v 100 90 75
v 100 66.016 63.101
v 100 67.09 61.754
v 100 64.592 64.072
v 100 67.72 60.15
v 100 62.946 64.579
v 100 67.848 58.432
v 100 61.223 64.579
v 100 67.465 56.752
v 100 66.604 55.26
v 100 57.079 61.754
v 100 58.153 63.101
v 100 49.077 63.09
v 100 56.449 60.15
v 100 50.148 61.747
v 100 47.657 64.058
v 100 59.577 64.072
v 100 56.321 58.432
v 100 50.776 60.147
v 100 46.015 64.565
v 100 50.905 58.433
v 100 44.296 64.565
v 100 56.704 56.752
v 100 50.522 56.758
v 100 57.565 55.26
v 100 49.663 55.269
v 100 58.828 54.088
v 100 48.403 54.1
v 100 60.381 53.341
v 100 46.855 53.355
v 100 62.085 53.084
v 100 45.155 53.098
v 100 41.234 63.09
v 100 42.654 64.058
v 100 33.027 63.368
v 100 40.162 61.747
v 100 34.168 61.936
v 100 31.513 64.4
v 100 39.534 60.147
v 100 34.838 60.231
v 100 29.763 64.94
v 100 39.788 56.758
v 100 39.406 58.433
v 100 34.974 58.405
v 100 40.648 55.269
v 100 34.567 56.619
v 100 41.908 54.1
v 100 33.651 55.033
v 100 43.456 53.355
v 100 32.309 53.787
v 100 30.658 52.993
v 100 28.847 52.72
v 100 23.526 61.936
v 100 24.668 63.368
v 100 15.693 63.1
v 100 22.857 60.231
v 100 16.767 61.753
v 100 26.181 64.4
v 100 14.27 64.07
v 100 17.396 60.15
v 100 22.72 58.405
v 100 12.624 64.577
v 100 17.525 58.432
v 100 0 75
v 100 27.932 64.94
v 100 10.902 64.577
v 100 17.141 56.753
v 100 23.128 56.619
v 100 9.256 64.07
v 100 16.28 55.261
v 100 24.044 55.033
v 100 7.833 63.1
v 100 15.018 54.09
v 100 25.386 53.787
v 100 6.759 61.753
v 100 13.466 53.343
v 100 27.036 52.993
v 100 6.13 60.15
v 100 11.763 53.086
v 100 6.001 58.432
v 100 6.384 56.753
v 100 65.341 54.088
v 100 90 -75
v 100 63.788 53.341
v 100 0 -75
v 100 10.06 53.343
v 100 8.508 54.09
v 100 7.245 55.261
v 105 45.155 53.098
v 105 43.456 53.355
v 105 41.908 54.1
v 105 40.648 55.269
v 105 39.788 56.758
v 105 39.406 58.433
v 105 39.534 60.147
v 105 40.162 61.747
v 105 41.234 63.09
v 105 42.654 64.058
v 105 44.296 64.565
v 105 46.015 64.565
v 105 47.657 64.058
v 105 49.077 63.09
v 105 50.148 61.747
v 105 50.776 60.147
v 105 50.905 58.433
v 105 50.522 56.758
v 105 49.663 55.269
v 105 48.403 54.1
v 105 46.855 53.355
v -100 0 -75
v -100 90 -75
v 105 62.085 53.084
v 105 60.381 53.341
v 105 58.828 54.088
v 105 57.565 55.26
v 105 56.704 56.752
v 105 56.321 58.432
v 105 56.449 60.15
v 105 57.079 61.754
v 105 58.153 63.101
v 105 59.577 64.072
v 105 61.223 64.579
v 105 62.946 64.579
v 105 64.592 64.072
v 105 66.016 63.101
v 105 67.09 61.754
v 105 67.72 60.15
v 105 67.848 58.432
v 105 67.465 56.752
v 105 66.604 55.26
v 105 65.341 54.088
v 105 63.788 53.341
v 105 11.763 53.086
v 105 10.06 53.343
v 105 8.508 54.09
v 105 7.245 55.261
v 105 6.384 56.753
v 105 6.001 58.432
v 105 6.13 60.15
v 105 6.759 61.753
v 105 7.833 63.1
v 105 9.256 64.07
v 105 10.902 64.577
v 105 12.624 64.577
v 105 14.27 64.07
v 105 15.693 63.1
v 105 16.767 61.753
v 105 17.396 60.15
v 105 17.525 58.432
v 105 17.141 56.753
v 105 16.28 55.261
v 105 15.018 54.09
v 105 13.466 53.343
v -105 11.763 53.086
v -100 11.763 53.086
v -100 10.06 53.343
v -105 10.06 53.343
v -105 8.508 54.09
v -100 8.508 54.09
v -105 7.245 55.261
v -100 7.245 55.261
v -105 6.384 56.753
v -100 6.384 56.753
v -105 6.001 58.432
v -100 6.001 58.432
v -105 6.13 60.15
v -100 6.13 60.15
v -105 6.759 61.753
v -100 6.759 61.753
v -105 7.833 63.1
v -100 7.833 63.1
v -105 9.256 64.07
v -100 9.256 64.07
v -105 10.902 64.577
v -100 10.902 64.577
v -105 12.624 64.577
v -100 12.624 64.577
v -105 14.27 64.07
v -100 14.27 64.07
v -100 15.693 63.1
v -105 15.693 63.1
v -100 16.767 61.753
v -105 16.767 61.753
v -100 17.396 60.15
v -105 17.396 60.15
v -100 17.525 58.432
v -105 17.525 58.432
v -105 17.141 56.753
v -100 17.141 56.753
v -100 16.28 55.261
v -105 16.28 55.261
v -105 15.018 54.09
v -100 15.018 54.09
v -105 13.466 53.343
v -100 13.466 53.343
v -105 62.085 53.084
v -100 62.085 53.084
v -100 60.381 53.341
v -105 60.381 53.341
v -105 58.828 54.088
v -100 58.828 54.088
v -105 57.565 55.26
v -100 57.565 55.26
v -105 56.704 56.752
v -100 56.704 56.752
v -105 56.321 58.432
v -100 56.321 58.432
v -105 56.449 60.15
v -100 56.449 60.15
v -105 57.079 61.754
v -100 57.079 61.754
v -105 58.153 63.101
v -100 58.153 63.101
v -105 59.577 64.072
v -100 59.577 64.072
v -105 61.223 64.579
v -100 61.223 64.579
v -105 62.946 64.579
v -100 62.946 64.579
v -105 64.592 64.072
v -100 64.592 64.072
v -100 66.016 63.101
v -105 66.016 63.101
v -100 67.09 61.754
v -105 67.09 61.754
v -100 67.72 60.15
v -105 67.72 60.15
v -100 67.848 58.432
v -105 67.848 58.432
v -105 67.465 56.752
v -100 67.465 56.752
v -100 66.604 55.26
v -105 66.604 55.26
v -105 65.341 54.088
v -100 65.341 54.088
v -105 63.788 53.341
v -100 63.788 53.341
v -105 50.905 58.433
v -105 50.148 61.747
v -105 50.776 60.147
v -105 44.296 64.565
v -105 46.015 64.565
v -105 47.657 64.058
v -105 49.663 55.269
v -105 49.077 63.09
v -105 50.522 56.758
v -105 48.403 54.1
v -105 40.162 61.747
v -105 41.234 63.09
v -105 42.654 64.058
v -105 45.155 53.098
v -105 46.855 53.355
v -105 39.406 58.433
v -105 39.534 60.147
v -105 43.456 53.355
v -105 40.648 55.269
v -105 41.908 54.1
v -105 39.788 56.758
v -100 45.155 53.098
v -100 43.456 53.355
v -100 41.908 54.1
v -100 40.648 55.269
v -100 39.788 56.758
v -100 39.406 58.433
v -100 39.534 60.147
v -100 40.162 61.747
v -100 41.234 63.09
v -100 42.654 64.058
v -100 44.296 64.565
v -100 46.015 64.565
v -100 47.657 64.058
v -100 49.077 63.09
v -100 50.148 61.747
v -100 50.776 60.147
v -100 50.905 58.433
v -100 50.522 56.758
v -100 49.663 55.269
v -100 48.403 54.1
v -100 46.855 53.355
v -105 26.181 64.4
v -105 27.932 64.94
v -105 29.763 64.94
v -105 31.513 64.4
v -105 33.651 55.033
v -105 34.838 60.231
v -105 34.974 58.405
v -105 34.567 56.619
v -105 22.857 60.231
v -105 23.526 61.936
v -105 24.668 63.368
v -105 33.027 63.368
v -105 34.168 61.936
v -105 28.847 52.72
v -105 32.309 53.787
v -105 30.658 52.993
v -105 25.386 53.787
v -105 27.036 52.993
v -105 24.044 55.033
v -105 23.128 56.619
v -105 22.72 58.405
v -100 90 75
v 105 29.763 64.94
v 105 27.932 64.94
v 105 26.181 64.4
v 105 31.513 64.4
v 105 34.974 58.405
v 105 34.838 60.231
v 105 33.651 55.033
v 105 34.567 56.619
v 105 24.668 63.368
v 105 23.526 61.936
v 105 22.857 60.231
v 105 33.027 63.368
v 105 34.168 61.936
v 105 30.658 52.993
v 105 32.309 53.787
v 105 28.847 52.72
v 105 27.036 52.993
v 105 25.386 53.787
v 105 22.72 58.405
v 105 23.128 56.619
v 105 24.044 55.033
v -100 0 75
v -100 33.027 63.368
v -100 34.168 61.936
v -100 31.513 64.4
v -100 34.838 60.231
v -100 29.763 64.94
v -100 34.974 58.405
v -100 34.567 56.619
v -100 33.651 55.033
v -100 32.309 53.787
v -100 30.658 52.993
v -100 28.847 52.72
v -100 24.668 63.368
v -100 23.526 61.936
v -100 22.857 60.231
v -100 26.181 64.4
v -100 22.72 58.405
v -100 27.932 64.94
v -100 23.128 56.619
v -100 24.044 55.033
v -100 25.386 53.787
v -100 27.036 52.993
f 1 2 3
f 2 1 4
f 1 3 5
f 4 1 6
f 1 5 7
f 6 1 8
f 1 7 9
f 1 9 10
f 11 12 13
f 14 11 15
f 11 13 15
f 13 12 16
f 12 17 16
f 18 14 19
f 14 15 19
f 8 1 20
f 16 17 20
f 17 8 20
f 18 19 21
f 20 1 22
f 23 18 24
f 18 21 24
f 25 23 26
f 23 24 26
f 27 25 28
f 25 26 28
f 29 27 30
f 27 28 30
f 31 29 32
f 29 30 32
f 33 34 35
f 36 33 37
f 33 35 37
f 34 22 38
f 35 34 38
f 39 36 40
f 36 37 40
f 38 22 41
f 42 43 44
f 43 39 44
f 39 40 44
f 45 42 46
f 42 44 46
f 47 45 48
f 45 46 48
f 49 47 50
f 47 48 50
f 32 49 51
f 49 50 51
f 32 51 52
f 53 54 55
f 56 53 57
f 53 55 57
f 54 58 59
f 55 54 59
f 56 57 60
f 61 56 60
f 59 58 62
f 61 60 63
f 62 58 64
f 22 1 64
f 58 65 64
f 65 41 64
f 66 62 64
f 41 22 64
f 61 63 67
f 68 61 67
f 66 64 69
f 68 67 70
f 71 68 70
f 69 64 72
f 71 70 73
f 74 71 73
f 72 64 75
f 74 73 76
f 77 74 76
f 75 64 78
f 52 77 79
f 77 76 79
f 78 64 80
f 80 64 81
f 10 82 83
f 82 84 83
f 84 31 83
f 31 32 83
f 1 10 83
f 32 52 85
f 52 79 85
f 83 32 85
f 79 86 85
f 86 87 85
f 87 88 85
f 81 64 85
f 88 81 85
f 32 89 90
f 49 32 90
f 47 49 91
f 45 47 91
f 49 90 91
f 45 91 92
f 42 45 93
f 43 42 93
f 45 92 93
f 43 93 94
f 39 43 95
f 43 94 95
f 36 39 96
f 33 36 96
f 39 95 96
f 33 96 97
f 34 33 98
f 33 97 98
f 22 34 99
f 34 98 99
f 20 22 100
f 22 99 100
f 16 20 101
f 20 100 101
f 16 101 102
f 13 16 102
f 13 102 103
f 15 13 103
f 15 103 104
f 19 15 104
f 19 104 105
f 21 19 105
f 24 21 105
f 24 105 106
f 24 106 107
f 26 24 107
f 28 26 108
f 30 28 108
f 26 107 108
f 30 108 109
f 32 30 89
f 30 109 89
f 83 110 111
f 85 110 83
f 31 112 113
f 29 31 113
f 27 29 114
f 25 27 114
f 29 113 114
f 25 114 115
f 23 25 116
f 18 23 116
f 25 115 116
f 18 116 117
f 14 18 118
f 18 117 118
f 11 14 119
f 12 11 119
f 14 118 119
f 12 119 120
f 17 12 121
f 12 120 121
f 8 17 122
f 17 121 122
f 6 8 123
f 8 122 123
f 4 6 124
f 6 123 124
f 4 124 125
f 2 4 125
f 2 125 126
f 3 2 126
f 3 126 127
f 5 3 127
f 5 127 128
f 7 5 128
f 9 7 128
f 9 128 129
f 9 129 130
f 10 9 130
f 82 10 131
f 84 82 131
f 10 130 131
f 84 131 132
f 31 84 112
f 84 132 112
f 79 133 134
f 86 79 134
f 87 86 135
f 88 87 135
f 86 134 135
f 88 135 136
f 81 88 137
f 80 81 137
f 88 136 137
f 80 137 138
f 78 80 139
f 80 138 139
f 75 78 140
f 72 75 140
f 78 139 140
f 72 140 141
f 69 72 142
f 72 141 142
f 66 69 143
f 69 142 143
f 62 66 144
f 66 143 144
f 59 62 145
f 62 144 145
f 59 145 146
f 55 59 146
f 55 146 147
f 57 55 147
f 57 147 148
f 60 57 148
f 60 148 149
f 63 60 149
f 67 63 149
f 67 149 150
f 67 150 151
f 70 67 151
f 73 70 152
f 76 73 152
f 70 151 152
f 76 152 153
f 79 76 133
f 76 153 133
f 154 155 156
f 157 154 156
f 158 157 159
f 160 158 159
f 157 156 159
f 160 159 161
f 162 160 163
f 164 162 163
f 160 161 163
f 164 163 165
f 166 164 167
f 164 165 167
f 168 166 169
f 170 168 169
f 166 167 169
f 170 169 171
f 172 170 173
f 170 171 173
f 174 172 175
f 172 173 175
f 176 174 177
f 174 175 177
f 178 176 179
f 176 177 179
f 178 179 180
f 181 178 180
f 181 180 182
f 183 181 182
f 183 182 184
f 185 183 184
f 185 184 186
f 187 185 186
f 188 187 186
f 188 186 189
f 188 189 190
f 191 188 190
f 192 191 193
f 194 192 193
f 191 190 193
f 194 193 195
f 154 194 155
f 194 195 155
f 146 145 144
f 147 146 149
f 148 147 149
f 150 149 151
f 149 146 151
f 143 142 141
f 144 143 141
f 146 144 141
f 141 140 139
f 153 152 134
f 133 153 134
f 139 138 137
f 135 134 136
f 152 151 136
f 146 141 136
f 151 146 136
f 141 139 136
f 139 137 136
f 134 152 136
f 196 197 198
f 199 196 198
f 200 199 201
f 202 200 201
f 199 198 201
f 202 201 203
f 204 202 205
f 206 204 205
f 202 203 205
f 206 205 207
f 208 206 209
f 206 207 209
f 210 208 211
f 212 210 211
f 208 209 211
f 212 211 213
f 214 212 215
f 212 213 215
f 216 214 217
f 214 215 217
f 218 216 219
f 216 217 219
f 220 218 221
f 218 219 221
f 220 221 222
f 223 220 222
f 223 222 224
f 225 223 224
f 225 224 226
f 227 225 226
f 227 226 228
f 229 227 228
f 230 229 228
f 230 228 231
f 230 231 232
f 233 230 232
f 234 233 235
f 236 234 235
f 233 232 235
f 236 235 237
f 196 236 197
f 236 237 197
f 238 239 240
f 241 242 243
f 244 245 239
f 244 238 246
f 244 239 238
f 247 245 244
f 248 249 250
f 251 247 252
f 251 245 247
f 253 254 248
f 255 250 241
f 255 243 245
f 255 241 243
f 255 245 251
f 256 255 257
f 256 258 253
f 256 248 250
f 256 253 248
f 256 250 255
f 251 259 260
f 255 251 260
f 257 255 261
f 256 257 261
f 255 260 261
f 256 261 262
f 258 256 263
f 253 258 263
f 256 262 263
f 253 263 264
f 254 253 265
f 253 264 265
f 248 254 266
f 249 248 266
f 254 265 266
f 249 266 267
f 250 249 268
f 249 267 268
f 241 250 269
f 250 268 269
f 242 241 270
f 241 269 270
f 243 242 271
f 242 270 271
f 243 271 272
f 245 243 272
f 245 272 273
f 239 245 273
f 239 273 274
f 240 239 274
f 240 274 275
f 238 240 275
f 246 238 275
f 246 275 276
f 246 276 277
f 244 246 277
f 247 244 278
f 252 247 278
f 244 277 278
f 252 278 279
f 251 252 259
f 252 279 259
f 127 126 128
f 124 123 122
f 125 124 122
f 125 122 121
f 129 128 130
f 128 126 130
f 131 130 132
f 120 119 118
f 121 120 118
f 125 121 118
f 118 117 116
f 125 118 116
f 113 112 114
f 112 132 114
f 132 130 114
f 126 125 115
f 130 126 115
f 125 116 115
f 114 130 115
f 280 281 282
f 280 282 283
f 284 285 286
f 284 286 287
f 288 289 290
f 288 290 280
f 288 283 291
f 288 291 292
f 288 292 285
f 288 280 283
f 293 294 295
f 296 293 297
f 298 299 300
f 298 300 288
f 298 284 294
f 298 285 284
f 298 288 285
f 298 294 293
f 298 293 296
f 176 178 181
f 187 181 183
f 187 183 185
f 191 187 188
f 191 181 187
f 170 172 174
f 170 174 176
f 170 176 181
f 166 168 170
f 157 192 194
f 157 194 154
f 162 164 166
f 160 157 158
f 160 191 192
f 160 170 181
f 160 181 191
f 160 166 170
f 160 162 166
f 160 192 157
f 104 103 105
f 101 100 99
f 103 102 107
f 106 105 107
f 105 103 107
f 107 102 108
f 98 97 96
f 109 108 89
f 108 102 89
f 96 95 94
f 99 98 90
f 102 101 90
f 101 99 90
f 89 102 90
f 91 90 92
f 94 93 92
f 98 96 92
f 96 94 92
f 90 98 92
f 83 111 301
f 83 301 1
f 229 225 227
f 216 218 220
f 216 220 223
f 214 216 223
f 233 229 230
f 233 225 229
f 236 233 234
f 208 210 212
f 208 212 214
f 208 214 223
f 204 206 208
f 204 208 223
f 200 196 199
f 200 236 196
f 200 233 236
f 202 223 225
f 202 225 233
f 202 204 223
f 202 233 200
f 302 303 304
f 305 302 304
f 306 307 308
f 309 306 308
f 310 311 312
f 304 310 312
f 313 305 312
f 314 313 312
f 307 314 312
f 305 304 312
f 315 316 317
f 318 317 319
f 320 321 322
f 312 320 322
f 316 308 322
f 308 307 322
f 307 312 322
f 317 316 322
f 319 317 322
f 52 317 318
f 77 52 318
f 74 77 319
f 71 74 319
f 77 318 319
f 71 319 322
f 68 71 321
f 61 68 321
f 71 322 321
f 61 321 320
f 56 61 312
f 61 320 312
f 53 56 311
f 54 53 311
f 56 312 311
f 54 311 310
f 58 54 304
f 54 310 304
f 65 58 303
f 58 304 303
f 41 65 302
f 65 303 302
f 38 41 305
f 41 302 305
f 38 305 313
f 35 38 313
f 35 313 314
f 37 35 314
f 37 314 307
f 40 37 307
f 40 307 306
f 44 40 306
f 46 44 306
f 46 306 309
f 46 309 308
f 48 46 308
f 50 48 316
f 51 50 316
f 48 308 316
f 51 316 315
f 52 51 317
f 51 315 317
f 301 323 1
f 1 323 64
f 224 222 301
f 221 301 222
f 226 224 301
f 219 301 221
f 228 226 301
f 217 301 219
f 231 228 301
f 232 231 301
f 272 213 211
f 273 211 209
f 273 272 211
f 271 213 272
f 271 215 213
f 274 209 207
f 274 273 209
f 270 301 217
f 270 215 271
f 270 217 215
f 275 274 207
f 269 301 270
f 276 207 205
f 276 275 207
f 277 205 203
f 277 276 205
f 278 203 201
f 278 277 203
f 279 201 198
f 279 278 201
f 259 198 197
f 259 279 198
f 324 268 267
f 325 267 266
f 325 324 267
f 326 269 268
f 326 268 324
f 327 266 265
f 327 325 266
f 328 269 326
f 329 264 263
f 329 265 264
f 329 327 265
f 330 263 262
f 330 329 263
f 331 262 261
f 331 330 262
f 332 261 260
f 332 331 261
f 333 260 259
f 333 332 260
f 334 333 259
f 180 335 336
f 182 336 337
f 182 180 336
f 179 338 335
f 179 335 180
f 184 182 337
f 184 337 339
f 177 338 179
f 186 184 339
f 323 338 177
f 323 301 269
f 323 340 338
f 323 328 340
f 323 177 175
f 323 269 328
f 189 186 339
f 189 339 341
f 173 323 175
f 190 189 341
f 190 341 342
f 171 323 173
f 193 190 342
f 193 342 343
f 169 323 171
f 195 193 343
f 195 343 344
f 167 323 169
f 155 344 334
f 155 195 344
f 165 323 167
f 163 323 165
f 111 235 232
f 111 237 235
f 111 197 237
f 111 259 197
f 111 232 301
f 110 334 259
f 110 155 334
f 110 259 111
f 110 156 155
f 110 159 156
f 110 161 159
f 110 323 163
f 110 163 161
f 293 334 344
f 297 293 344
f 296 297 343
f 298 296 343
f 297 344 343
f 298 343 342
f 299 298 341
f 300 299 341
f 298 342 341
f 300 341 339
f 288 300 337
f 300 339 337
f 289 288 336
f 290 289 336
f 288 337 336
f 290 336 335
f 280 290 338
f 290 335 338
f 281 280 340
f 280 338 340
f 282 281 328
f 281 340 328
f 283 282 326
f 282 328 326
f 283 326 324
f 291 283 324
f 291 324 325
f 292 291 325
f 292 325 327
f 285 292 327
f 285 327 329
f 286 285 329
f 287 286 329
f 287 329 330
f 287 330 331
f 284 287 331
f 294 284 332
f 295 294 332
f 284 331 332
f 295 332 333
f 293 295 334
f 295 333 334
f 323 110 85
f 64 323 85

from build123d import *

# Parameters (mm, degrees)
SKETCH1_W           = 200
SKETCH1_H           = 150
BOSS_EXTRUDE1_DEPTH = 90
SKETCH2_R           = 5.778007253
SKETCH2_R_2         = 6.144226379
SKETCH2_R_3         = 5.765469067
SKETCH2_R_4         = 5.780094306
BOSS_EXTRUDE2_DEPTH = 5
BOSS_EXTRUDE3_START = -205
SKETCH2_2_R         = 5.778007253
SKETCH2_2_R_2       = 6.144226379
SKETCH2_2_R_3       = 5.765469067
SKETCH2_2_R_4       = 5.780094306
BOSS_EXTRUDE3_DEPTH = 5


with BuildPart() as part:
    # Sketch1 → Boss-Extrude1 (new body)
    with BuildSketch(Plane(origin=(0, 0, 0), x_dir=(1, 0, 0), z_dir=(0, 1, 0))):
        Rectangle(SKETCH1_W, SKETCH1_H)
    extrude(amount=BOSS_EXTRUDE1_DEPTH)

    # Sketch2 → Boss-Extrude2 (add)
    with BuildSketch(Plane.ZY.offset(100)):
        with Locations((58.863929125, 11.762847407)):
            Circle(SKETCH2_R)
        with Locations((58.863929125, 28.847365095)):
            Circle(SKETCH2_R_2)
        with Locations((58.863929125, 45.155313797)):
            Circle(SKETCH2_R_3)
        with Locations((58.863929125, 62.084517688)):
            Circle(SKETCH2_R_4)
    extrude(amount=BOSS_EXTRUDE2_DEPTH)

    # Sketch2<2> → Boss-Extrude3 (add)
    with BuildSketch(Plane.ZY.offset(100).offset(BOSS_EXTRUDE3_START)):
        with Locations((58.863929125, 11.762847407)):
            Circle(SKETCH2_2_R)
        with Locations((58.863929125, 28.847365095)):
            Circle(SKETCH2_2_R_2)
        with Locations((58.863929125, 45.155313797)):
            Circle(SKETCH2_2_R_3)
        with Locations((58.863929125, 62.084517688)):
            Circle(SKETCH2_2_R_4)
    extrude(amount=BOSS_EXTRUDE3_DEPTH)


solid = part.part
